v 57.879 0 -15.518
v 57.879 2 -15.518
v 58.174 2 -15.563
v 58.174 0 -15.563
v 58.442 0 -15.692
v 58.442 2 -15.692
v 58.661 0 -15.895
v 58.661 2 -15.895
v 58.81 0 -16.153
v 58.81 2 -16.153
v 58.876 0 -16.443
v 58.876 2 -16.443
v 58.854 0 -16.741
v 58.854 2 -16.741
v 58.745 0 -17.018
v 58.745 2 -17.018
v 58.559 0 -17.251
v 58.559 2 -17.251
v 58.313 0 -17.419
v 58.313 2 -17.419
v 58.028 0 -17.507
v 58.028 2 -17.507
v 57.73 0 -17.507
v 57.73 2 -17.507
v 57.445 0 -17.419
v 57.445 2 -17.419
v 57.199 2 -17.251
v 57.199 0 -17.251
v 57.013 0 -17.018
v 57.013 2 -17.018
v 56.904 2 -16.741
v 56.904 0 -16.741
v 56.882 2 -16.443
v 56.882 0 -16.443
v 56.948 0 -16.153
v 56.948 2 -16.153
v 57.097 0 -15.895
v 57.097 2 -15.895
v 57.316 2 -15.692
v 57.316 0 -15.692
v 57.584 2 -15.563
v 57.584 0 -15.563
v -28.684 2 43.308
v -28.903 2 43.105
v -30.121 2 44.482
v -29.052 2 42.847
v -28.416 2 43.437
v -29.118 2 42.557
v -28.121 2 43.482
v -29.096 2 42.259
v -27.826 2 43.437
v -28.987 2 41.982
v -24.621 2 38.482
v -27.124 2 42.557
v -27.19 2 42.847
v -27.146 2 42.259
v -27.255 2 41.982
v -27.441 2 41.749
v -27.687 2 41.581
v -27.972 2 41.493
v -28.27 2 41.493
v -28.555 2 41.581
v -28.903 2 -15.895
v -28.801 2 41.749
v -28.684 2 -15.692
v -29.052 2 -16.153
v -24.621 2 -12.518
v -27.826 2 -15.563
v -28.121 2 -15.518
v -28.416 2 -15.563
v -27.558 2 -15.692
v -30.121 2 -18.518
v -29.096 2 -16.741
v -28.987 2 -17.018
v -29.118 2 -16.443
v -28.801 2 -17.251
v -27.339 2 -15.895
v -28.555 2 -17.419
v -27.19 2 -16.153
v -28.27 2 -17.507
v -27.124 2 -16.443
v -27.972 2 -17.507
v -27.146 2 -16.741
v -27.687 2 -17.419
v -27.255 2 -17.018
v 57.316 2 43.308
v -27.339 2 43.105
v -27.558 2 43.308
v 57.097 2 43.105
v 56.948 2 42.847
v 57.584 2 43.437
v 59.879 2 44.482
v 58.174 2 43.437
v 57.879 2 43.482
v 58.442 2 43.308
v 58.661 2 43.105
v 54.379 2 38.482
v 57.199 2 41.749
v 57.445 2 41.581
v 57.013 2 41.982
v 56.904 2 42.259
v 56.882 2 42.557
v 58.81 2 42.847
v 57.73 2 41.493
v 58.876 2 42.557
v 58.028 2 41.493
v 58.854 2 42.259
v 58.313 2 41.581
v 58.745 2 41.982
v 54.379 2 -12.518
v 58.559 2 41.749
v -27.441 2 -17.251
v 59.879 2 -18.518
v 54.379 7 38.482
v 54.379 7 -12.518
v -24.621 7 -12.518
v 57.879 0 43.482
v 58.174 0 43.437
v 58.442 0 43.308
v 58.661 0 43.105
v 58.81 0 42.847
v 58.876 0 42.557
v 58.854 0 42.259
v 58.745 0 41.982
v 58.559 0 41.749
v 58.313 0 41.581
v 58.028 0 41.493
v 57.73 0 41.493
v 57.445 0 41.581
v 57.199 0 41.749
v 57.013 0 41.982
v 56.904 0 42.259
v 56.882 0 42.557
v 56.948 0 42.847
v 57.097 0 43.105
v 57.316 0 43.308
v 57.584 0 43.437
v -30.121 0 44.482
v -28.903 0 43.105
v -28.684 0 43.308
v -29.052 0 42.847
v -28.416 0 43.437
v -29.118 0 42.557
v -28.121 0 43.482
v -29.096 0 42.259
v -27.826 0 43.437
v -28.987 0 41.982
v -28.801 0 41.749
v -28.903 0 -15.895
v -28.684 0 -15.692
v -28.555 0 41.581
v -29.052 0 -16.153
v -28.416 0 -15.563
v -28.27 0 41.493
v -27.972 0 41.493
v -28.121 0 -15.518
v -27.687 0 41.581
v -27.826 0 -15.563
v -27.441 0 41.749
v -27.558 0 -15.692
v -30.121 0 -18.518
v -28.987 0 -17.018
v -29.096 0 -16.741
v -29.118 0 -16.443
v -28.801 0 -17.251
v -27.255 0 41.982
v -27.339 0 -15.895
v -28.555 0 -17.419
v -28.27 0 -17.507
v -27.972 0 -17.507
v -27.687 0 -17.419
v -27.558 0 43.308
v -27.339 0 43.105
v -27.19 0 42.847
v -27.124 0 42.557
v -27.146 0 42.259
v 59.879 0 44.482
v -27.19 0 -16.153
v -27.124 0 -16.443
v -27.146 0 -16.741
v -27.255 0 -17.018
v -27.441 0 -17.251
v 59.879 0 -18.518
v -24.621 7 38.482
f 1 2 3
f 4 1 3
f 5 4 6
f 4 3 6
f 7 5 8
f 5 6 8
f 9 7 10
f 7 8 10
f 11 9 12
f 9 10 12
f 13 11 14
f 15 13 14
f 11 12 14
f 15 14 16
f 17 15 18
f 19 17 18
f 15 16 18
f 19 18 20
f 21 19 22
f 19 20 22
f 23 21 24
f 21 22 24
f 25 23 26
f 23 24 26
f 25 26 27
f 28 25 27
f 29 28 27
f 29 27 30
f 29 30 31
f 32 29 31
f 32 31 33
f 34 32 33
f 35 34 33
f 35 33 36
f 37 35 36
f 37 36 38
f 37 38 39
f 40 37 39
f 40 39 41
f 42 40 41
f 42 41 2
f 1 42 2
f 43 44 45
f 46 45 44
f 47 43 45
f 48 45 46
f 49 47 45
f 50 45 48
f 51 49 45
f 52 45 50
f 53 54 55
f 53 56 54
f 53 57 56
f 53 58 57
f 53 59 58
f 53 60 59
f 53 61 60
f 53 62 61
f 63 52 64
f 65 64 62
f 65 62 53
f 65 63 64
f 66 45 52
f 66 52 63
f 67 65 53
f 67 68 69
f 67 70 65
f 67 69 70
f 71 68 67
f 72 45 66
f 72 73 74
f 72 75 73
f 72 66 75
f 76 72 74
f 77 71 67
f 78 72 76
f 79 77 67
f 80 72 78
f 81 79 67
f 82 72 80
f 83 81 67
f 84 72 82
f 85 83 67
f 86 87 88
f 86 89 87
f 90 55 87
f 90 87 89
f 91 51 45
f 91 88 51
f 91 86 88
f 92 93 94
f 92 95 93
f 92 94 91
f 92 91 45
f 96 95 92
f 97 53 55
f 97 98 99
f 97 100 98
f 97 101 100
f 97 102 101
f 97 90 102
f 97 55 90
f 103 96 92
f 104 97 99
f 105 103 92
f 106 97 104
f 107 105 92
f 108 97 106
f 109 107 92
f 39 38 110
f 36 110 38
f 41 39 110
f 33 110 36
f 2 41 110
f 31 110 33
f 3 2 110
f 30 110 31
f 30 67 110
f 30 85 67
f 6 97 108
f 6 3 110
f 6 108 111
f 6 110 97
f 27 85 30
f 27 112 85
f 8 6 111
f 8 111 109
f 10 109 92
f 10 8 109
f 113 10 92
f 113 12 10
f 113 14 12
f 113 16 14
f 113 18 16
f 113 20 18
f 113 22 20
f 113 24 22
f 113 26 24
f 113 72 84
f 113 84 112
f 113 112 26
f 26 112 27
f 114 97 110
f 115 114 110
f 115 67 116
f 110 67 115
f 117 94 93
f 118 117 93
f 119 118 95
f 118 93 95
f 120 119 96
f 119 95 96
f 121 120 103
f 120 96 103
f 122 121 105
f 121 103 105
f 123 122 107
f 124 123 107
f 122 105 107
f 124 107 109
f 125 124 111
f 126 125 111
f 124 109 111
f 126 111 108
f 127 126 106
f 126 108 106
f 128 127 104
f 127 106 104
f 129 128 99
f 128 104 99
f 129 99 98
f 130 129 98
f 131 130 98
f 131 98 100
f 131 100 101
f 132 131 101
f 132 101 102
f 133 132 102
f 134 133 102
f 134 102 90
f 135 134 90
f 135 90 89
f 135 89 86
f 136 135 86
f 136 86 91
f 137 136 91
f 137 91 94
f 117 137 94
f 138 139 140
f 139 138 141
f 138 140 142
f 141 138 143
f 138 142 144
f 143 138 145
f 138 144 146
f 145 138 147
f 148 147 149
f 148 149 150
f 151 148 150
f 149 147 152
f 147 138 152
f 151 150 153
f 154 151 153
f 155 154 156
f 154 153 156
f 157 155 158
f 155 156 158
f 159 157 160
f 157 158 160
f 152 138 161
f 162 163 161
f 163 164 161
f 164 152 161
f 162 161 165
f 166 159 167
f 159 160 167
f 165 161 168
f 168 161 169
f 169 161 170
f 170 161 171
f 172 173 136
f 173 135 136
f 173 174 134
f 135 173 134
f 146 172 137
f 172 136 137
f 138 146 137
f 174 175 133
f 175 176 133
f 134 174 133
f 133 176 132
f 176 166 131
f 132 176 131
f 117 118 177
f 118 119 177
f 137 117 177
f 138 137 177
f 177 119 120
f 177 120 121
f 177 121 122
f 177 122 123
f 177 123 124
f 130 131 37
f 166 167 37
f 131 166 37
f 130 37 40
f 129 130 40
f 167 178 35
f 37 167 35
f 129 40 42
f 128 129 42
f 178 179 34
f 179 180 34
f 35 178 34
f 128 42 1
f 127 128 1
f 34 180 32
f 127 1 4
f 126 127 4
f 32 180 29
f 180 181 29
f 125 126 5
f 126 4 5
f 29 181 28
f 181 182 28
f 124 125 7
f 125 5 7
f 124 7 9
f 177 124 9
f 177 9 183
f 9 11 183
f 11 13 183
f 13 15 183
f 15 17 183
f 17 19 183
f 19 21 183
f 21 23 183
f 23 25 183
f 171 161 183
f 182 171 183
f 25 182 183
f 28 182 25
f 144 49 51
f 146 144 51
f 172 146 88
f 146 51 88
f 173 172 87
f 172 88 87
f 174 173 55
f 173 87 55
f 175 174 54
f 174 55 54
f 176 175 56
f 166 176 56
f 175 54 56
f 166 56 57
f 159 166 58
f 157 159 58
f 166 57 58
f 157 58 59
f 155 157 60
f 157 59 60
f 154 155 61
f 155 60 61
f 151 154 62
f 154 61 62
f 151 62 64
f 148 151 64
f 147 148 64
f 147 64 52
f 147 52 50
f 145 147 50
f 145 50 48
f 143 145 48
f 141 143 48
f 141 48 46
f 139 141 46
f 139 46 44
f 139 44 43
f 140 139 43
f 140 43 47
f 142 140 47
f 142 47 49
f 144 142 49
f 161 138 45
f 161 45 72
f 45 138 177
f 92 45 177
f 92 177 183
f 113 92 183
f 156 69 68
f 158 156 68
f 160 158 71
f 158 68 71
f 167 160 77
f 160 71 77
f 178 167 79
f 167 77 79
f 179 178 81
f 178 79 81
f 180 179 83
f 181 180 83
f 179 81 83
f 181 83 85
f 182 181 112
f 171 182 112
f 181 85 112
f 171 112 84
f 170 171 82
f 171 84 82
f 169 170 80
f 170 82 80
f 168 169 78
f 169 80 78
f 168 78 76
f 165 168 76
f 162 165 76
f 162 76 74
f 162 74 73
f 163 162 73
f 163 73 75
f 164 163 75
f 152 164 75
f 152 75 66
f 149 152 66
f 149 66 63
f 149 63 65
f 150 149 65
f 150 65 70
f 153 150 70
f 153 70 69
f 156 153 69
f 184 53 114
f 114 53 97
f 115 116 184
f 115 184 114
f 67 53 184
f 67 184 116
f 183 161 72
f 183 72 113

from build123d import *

# Parameters (mm, degrees)
SKETCH_1_W          = 90
SKETCH_1_H          = 63
EXTRUDE_1_DEPTH     = 2
SKETCH_2_W          = 79
SKETCH_2_H          = 51
EXTRUDE_2_DEPTH     = 5
SKETCH_3_R          = 1
CUT_EXTRUDE_1_DEPTH = 75.760510392


with BuildPart() as part:
    # 草图1 → 凸台-拉伸1 (new body)
    with BuildSketch(Plane(origin=(0, 0, 0), x_dir=(1, 0, 0), z_dir=(0, 1, 0))):
        with Locations((14.879032258, -12.981854839)):
            Rectangle(SKETCH_1_W, SKETCH_1_H)
    extrude(amount=EXTRUDE_1_DEPTH)

    # 草图2 → 凸台-拉伸2 (add)
    with BuildSketch(Plane(origin=(0, 2, 0), x_dir=(1, 0, 0), z_dir=(0, 1, 0))):
        with Locations((14.879032258, -12.981854839)):
            Rectangle(SKETCH_2_W, SKETCH_2_H)
    extrude(amount=EXTRUDE_2_DEPTH)

    # 草图3 → 切除-拉伸1 (cut, through all)
    with BuildSketch(Plane(origin=(0, 2, 0), x_dir=(1, 0, 0), z_dir=(0, 1, 0))):
        with Locations(Location((-28.120967742, 16.518145161, 0), (0, 0, 270))):
            Circle(SKETCH_3_R)
        with Locations(Location((-28.120967742, -42.481854839, 0), (0, 0, 270))):
            Circle(SKETCH_3_R)
        with Locations(Location((57.879032258, -42.481854839, 0), (0, 0, 270))):
            Circle(SKETCH_3_R)
        with Locations(Location((57.879032258, 16.518145161, 0), (0, 0, 270))):
            Circle(SKETCH_3_R)
    extrude(amount=-CUT_EXTRUDE_1_DEPTH, mode=Mode.SUBTRACT)


solid = part.part
